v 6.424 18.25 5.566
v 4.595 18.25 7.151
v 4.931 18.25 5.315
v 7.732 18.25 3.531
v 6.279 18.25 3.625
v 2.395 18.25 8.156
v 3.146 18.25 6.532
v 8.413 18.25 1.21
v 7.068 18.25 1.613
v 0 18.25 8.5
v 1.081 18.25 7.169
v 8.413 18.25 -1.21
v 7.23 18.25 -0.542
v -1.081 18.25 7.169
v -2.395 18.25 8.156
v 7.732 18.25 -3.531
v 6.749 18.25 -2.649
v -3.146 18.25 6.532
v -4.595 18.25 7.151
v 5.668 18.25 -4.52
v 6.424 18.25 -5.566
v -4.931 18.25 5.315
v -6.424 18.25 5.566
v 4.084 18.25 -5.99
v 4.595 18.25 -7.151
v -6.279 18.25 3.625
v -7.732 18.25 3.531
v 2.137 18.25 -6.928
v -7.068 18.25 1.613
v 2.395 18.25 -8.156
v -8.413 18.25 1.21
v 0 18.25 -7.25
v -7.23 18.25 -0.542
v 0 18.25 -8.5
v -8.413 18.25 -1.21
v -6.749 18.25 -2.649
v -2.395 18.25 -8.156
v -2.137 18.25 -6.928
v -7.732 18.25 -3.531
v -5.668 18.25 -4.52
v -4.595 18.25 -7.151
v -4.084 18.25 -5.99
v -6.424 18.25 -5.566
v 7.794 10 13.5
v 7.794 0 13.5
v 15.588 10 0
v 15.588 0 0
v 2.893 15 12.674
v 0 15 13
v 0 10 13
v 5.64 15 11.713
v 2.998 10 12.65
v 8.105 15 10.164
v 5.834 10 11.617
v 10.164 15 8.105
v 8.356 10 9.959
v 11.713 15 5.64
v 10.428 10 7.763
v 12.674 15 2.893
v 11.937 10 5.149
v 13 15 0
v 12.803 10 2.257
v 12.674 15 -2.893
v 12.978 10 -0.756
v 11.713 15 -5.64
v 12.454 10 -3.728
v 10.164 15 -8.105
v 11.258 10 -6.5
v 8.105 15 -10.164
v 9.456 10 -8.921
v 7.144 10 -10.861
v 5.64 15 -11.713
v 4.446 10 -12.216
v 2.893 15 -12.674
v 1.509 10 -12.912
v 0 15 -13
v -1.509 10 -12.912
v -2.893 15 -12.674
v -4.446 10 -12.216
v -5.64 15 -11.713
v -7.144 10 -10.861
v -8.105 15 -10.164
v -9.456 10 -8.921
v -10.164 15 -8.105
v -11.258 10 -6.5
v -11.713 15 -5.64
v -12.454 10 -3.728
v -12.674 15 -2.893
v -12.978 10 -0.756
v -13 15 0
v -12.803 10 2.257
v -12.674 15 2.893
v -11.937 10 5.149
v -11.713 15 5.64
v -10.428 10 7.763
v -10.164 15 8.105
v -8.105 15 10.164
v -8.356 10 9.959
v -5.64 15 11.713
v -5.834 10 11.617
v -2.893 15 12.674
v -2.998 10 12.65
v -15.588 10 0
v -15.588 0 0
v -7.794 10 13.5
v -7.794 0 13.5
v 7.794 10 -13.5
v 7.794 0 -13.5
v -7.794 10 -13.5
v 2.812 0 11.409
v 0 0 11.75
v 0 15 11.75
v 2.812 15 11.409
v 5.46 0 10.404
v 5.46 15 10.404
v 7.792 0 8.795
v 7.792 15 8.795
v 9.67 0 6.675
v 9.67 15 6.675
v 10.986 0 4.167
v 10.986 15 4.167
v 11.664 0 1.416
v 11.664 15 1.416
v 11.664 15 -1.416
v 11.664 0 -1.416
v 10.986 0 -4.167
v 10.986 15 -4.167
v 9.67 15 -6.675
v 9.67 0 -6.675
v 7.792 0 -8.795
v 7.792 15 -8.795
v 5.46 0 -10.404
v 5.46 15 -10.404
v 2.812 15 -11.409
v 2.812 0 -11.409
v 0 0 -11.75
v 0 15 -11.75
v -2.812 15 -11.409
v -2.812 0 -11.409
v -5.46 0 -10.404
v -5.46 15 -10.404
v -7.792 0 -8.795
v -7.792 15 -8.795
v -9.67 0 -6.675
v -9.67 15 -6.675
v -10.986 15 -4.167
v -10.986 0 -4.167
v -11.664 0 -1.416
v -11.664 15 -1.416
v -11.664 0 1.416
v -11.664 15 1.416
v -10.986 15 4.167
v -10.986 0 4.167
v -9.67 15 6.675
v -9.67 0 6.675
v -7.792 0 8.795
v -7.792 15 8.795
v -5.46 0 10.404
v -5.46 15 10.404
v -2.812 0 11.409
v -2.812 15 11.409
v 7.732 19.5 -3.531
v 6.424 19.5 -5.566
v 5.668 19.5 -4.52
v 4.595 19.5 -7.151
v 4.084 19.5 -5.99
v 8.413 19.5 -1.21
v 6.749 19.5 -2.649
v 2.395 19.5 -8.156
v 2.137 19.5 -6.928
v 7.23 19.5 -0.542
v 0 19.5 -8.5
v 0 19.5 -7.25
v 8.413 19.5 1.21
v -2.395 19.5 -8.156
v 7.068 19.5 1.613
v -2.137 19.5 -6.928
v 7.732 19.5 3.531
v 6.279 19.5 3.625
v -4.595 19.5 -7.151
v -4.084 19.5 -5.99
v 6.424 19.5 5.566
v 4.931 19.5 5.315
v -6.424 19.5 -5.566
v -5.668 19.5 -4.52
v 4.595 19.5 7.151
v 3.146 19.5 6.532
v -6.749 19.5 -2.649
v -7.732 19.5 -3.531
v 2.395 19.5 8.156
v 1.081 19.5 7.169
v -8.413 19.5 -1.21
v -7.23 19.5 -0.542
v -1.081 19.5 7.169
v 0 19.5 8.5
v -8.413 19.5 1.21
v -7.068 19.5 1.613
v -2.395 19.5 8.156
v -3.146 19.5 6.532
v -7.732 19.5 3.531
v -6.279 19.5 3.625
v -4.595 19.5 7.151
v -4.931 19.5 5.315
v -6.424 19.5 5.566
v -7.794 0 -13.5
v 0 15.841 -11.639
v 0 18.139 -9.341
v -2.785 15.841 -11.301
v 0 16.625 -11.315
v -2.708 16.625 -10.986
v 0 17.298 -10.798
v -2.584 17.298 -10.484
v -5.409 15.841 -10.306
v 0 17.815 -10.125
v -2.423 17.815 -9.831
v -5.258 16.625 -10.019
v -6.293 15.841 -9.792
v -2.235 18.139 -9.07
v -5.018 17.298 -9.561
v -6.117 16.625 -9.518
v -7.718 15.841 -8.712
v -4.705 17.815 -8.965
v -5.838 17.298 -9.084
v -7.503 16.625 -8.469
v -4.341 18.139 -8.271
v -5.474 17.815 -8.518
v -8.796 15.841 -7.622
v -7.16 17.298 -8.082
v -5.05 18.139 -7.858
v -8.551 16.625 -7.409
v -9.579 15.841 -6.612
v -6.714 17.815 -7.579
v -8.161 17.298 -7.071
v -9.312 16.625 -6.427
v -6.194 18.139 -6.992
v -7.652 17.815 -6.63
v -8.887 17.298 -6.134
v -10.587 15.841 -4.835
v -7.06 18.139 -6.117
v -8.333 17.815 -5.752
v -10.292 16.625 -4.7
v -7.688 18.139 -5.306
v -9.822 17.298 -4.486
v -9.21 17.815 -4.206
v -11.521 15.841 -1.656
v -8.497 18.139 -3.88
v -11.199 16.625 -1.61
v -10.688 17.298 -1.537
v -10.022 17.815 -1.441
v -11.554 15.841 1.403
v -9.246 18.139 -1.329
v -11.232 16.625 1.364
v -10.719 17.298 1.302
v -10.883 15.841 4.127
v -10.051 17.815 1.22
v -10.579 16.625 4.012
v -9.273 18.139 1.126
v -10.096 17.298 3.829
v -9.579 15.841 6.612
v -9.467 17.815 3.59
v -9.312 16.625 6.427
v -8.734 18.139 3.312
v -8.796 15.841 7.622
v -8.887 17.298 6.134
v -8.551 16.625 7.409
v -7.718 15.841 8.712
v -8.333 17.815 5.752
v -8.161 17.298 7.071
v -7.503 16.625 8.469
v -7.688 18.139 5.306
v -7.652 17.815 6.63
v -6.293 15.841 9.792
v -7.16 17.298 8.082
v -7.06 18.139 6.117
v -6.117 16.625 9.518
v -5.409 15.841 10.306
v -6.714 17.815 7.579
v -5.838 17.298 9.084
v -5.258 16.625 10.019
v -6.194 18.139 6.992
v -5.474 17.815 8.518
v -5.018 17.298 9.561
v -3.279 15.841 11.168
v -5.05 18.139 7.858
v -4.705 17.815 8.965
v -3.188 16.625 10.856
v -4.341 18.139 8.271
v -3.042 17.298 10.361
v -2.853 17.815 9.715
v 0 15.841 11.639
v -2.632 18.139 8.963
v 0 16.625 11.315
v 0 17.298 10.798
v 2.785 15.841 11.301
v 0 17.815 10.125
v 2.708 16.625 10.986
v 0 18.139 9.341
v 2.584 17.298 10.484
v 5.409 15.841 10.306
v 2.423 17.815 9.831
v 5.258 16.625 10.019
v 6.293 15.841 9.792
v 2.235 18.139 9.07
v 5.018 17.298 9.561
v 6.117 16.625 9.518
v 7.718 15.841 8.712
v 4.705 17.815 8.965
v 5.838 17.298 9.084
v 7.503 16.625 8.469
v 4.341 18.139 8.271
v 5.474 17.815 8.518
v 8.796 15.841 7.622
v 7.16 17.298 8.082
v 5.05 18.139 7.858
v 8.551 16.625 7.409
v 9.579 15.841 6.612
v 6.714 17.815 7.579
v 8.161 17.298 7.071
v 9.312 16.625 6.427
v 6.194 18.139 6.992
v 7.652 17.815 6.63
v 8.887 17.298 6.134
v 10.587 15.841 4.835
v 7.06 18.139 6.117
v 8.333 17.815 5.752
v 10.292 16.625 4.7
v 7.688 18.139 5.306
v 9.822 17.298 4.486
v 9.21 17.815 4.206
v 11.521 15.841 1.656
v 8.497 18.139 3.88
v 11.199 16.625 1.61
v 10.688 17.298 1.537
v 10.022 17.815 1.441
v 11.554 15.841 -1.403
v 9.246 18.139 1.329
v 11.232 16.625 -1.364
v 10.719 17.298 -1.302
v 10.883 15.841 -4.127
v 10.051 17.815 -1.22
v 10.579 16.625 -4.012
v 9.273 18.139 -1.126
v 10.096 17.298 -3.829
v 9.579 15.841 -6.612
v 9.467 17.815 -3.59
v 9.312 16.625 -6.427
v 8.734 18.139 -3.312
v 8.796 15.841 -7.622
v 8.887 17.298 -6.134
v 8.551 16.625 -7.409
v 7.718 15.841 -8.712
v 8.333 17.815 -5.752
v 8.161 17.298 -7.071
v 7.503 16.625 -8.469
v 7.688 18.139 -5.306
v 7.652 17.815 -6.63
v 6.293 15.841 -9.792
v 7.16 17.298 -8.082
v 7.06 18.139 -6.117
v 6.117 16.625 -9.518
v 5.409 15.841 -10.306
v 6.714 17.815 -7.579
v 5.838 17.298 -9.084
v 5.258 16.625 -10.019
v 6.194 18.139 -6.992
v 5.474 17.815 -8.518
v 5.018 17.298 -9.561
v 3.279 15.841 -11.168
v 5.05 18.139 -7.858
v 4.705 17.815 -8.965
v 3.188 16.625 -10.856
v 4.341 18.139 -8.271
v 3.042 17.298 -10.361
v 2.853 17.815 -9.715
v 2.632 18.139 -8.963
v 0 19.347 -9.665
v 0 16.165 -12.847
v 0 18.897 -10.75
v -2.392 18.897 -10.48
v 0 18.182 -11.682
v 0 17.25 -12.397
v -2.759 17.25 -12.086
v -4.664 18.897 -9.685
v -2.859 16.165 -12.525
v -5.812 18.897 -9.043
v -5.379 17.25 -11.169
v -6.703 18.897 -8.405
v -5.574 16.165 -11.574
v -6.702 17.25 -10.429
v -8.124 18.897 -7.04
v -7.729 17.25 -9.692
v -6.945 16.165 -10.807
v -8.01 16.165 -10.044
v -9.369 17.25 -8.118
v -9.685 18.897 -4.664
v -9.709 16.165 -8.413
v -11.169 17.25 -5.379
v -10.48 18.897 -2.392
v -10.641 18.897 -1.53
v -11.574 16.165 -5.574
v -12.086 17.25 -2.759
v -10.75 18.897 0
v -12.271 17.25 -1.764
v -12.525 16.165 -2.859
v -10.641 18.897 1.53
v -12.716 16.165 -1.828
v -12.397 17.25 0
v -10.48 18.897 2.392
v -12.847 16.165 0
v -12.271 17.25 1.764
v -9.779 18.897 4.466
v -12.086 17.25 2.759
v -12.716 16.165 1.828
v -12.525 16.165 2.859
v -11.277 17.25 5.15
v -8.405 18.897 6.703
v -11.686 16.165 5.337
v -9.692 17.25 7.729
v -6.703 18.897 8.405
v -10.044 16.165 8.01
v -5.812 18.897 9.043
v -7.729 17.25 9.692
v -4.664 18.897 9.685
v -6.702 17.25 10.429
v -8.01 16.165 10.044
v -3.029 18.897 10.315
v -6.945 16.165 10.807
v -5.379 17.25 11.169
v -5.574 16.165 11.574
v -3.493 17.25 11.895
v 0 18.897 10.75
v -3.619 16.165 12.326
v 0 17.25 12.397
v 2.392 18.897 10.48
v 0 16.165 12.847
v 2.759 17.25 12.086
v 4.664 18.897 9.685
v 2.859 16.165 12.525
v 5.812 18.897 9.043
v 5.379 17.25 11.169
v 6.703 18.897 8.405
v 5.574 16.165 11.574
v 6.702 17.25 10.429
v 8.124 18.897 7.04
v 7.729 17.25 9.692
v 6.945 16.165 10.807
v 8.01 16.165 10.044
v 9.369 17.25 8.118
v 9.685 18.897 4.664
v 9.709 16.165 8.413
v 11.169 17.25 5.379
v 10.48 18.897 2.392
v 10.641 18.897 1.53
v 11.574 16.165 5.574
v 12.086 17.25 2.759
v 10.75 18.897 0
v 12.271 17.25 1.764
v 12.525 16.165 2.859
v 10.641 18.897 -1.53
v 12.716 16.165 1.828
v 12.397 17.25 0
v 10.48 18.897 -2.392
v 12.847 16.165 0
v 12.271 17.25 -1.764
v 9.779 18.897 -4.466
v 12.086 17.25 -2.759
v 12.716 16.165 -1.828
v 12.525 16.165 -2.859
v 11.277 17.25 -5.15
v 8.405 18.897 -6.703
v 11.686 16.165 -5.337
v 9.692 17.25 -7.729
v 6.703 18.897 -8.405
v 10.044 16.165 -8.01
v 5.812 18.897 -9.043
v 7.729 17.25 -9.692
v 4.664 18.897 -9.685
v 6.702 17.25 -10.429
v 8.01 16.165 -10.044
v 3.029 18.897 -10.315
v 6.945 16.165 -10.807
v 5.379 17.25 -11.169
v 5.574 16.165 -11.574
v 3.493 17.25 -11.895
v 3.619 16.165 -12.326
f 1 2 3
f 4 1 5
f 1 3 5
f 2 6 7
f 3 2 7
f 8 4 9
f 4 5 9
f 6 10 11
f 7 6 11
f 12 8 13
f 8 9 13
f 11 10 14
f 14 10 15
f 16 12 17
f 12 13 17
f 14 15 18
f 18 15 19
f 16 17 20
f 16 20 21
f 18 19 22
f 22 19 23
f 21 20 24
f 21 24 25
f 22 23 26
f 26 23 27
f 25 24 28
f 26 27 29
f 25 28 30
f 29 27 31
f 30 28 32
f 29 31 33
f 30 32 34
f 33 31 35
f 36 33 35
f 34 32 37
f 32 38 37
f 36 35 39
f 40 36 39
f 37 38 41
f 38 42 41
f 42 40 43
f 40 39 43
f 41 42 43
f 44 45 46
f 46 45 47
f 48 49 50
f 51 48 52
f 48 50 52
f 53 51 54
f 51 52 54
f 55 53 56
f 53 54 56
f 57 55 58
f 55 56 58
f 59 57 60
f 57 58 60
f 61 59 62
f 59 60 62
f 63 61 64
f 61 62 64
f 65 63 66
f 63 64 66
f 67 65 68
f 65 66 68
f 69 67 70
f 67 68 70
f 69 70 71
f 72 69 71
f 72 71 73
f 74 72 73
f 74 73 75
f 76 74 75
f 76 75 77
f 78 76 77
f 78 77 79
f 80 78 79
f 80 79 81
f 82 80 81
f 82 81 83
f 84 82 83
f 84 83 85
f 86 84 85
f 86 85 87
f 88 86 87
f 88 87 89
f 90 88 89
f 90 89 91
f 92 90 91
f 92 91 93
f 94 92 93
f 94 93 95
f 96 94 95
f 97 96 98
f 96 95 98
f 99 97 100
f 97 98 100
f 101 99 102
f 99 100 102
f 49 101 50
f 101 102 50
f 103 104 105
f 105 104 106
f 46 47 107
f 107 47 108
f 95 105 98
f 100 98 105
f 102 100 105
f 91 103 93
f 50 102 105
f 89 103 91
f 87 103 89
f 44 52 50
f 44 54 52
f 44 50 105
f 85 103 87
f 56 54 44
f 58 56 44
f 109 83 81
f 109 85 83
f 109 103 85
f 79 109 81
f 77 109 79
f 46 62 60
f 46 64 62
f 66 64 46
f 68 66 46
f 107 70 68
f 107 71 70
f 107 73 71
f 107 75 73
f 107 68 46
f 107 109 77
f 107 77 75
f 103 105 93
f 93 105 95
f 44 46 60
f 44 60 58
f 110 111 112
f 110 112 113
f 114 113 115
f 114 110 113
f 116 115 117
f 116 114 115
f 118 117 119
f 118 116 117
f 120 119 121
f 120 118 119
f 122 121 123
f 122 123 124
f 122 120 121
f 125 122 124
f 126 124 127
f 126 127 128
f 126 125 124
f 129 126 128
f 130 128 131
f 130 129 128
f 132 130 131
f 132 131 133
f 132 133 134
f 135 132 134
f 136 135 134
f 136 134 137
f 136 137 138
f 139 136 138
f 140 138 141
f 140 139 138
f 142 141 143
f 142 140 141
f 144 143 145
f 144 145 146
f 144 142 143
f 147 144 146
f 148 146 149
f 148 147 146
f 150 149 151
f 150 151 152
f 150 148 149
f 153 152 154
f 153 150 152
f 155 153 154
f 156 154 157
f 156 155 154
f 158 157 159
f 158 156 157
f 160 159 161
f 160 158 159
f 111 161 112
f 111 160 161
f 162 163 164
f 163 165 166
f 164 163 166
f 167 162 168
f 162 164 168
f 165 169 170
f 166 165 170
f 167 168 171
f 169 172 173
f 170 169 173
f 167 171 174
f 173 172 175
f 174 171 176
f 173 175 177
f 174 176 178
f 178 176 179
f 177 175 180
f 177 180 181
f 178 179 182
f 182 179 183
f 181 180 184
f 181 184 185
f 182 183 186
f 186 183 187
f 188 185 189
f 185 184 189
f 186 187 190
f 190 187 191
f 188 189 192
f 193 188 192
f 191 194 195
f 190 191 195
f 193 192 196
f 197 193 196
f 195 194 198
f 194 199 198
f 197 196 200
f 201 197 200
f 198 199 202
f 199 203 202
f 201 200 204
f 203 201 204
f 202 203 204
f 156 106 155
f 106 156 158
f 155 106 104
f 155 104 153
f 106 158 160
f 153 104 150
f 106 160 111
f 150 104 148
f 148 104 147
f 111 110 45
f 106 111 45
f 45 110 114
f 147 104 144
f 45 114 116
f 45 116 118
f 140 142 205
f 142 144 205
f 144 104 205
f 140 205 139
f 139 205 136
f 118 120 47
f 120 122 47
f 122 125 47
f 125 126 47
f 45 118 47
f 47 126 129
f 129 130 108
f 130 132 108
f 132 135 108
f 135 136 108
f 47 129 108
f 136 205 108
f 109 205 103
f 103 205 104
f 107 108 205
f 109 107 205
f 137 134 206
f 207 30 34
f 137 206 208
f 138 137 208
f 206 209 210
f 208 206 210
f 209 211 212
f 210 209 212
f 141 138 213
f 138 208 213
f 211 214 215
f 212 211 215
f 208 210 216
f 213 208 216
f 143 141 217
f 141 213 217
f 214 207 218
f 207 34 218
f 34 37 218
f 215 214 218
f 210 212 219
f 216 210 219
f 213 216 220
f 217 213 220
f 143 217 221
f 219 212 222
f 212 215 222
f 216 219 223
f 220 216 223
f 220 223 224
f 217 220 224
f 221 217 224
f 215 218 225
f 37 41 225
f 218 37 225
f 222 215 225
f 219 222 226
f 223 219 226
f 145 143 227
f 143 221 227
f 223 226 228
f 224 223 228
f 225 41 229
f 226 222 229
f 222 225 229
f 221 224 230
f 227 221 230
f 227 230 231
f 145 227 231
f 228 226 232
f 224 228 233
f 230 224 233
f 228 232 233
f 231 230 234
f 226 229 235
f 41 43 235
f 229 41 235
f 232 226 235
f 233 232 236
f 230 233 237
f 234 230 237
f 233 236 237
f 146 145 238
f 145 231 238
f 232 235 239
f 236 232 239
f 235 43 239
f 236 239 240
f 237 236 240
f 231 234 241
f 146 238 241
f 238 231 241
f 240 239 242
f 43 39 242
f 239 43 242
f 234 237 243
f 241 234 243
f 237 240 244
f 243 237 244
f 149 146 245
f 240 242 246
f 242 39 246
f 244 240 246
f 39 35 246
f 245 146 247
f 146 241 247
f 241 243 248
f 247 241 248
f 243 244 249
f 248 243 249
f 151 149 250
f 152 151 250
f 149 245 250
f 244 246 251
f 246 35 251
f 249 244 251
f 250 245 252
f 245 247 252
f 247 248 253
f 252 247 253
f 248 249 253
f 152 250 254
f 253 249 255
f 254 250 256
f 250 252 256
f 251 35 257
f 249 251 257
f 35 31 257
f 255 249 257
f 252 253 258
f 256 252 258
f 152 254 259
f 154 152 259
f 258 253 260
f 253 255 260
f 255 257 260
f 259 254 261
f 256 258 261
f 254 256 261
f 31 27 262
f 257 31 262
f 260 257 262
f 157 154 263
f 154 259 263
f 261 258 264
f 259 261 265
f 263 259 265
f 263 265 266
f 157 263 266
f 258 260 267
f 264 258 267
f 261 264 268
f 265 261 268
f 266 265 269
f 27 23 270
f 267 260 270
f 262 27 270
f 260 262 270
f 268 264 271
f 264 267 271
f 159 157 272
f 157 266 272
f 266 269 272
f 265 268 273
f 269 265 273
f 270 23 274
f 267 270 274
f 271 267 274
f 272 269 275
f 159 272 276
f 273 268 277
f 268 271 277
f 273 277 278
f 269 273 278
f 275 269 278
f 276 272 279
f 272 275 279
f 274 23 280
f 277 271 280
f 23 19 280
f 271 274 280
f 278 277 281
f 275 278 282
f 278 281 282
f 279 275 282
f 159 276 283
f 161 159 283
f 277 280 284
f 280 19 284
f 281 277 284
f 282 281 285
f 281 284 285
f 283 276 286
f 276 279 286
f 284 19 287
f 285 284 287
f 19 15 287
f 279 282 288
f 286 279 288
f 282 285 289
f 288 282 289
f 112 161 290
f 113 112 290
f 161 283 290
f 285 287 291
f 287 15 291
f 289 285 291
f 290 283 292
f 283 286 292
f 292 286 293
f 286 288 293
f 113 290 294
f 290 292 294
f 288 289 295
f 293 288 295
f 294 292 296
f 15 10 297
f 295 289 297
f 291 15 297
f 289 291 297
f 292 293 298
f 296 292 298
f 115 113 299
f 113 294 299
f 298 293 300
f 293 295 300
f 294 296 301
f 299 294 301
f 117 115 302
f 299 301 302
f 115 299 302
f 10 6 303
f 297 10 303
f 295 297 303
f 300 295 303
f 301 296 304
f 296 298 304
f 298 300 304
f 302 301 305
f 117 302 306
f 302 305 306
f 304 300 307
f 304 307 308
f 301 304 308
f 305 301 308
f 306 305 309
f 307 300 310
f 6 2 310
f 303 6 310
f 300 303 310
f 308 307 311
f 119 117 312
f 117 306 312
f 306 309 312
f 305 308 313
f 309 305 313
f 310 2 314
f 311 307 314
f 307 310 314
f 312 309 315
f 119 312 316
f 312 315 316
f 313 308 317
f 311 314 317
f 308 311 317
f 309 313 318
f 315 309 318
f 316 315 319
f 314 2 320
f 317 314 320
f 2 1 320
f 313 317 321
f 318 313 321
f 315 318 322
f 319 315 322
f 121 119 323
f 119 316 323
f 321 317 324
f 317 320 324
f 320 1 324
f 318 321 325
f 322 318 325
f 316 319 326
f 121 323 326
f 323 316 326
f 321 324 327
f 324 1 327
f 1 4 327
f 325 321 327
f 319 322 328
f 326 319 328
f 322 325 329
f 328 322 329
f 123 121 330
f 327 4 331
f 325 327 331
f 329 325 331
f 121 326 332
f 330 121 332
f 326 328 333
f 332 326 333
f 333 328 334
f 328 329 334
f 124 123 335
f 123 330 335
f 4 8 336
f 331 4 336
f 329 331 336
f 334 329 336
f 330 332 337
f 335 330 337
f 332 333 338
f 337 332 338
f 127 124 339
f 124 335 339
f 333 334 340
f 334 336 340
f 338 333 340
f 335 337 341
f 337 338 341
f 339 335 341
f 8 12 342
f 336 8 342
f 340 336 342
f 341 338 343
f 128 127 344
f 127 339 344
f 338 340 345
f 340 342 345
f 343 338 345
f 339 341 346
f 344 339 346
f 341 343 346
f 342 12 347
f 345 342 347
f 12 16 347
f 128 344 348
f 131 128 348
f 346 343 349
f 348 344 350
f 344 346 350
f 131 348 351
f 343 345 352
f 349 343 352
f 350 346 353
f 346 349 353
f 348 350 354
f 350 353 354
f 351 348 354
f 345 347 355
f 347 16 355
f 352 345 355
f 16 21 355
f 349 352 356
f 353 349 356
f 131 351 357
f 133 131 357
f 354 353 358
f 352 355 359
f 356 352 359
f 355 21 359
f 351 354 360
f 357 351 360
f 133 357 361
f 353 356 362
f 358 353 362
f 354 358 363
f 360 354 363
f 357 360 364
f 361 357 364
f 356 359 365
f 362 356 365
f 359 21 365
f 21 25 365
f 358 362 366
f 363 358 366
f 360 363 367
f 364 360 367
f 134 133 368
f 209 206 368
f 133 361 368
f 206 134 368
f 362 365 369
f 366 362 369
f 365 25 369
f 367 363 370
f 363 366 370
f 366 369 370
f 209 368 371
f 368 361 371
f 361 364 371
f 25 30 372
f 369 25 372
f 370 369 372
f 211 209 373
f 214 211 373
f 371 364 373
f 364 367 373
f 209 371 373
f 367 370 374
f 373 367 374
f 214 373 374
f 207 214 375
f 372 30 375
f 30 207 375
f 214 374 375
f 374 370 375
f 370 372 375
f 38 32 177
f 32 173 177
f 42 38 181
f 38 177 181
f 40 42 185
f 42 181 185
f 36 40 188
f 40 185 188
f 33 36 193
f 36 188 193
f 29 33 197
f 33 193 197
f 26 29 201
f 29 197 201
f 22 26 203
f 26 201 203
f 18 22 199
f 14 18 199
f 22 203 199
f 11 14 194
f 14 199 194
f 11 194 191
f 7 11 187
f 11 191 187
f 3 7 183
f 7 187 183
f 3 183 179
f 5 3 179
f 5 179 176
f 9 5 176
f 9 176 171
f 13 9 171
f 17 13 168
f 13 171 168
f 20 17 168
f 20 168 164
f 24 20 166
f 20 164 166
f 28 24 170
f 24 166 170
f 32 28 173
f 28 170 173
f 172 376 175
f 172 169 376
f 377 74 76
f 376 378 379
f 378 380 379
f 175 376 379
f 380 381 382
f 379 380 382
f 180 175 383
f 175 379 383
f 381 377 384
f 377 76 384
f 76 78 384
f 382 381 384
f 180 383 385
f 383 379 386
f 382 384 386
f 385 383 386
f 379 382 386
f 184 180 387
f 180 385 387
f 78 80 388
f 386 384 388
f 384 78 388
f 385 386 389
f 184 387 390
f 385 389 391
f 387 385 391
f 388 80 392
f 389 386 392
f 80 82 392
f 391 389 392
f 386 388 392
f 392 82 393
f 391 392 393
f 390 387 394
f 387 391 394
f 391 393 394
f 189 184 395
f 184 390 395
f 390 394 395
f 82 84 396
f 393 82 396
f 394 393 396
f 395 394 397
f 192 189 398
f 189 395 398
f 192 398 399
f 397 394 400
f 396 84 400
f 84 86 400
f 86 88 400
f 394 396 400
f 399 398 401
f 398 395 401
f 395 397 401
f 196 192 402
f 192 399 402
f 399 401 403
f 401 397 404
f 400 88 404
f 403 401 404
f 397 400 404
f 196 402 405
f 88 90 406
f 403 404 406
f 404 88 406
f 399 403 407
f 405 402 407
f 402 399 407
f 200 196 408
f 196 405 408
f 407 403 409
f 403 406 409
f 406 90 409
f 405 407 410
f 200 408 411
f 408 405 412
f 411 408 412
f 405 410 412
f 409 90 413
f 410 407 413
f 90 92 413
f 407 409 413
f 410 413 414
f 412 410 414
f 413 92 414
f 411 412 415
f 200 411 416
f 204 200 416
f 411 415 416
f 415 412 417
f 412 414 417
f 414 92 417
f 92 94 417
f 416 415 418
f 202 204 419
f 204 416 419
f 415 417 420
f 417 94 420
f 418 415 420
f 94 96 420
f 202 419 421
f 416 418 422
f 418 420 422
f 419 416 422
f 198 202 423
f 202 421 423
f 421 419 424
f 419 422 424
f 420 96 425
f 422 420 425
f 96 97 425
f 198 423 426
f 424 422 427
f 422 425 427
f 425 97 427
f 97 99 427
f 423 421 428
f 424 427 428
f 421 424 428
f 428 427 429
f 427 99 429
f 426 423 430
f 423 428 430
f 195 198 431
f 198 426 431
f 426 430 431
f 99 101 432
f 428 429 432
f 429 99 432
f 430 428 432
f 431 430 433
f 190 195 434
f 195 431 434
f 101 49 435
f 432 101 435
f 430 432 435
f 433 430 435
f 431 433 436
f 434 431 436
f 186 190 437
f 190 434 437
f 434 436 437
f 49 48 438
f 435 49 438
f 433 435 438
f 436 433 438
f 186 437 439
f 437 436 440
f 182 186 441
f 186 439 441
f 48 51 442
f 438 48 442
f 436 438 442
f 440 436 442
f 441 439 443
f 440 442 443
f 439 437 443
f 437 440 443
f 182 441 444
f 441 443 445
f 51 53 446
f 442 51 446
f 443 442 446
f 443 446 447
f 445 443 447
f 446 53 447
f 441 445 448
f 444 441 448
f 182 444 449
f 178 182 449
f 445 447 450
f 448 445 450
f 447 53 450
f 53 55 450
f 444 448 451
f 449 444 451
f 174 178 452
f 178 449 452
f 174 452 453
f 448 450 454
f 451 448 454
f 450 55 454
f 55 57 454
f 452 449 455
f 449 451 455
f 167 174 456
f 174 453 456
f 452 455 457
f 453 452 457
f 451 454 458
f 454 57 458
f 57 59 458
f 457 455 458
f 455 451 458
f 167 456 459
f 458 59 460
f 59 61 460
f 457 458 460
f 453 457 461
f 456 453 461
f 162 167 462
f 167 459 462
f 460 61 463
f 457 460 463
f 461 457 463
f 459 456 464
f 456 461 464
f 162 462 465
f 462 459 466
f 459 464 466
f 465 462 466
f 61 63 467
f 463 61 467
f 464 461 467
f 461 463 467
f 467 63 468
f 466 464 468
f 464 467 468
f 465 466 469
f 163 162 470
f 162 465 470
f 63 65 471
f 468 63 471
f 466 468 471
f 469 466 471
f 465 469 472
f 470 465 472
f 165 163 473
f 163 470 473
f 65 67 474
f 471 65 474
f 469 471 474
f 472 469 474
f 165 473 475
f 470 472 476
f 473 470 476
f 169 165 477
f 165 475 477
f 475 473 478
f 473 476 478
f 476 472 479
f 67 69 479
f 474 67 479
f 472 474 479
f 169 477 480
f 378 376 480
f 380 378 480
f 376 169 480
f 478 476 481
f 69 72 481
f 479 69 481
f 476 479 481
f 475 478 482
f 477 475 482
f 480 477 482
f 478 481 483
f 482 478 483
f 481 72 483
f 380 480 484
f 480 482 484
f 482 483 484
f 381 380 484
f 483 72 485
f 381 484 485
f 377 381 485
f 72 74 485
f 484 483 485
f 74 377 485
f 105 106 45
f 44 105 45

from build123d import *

# Parameters (mm, degrees)
SKIZZE1_R                       = 11.75
AUFSATZ_LINEAR_AUSTRAGEN1_DEPTH = 10
SKIZZE2_R                       = 13
SKIZZE2_R_2                     = 11.75
AUFSATZ_LINEAR_AUSTRAGEN2_DEPTH = 5


with BuildPart() as part:
    # Skizze1 → Aufsatz-Linear austragen1 (new body)
    with BuildSketch(Plane(origin=(0, 0, 0), x_dir=(1, 0, 0), z_dir=(0, 1, 0))):
        Polygon((15.588457268, 0), (7.794228634, 13.5), (-7.794228634, 13.5), (-15.588457268, 0), (-7.794228634, -13.5), (7.794228634, -13.5), align=None)
        with Locations(Location((0, 0, 0), (0, 0, 270))):
            Circle(SKIZZE1_R, mode=Mode.SUBTRACT)
    extrude(amount=AUFSATZ_LINEAR_AUSTRAGEN1_DEPTH)

    # Skizze2 → Aufsatz-Linear austragen2 (add)
    with BuildSketch(Plane(origin=(0, 10, 0), x_dir=(1, 0, 0), z_dir=(0, 1, 0))):
        with Locations(Location((0, 0, 0), (0, 0, 270))):
            Circle(SKIZZE2_R)
        with Locations(Location((0, 0, 0), (0, 0, 270))):
            Circle(SKIZZE2_R_2, mode=Mode.SUBTRACT)
    extrude(amount=AUFSATZ_LINEAR_AUSTRAGEN2_DEPTH)

    # Skizze3 → Rotation1 (revolve)
    with BuildSketch(Plane.XY, mode=Mode.PRIVATE) as rotation1_sk:
        with BuildLine():
            Line((-13, 15), (-11.75, 15))
            ThreePointArc((-11.75, 15), (-10.798097039, 17.298097039), (-8.5, 18.25))
            Line((-8.5, 18.25), (-7.25, 18.25))
            Line((-7.25, 18.25), (-7.25, 19.5))
            Line((-7.25, 19.5), (-8.5, 19.5))
            ThreePointArc((-8.5, 19.5), (-11.681980515, 18.181980515), (-13, 15))
        make_face()
    revolve(rotation1_sk.sketch.rotate(Axis((0, 0, 0), (0, 1, 0)), 270), axis=Axis((0, 0, 0), (0, 1, 0)))


solid = part.part
